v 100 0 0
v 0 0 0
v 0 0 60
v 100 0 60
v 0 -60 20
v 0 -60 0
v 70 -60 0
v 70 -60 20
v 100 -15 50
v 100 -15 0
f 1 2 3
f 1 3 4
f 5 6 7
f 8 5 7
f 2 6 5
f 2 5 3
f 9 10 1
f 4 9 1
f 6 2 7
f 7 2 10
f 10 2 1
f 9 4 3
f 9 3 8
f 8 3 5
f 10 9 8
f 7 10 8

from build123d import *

# Parameters (mm, degrees)
F0_W     = 100
F0_H     = 60
F1_DEPTH = 60
F3_DEPTH = 60
F5_DEPTH = 100


with BuildPart() as f1:
    # F0 (on Top) → F1 (new body)
    with BuildSketch(Plane.XY):
        with Locations((50, -30)):
            Rectangle(F0_W, F0_H)
    extrude(amount=F1_DEPTH)

    # F2 (on face) → F3 (cut, through all)
    with BuildSketch(Plane.XY.offset(60)):
        Polygon((100, -60), (100, -15), (70, -60), align=None)
    extrude(amount=-F3_DEPTH, mode=Mode.SUBTRACT)

    # F4 (on face) → F5 (cut, through all)
    with BuildSketch(Plane(origin=(0, 0, 0), x_dir=(0, -1, 0), z_dir=(-1, 0, 0))):
        Polygon((60, 60), (0, 60), (60, 20), align=None)
    extrude(amount=-F5_DEPTH, mode=Mode.SUBTRACT)


solid = f1.part
